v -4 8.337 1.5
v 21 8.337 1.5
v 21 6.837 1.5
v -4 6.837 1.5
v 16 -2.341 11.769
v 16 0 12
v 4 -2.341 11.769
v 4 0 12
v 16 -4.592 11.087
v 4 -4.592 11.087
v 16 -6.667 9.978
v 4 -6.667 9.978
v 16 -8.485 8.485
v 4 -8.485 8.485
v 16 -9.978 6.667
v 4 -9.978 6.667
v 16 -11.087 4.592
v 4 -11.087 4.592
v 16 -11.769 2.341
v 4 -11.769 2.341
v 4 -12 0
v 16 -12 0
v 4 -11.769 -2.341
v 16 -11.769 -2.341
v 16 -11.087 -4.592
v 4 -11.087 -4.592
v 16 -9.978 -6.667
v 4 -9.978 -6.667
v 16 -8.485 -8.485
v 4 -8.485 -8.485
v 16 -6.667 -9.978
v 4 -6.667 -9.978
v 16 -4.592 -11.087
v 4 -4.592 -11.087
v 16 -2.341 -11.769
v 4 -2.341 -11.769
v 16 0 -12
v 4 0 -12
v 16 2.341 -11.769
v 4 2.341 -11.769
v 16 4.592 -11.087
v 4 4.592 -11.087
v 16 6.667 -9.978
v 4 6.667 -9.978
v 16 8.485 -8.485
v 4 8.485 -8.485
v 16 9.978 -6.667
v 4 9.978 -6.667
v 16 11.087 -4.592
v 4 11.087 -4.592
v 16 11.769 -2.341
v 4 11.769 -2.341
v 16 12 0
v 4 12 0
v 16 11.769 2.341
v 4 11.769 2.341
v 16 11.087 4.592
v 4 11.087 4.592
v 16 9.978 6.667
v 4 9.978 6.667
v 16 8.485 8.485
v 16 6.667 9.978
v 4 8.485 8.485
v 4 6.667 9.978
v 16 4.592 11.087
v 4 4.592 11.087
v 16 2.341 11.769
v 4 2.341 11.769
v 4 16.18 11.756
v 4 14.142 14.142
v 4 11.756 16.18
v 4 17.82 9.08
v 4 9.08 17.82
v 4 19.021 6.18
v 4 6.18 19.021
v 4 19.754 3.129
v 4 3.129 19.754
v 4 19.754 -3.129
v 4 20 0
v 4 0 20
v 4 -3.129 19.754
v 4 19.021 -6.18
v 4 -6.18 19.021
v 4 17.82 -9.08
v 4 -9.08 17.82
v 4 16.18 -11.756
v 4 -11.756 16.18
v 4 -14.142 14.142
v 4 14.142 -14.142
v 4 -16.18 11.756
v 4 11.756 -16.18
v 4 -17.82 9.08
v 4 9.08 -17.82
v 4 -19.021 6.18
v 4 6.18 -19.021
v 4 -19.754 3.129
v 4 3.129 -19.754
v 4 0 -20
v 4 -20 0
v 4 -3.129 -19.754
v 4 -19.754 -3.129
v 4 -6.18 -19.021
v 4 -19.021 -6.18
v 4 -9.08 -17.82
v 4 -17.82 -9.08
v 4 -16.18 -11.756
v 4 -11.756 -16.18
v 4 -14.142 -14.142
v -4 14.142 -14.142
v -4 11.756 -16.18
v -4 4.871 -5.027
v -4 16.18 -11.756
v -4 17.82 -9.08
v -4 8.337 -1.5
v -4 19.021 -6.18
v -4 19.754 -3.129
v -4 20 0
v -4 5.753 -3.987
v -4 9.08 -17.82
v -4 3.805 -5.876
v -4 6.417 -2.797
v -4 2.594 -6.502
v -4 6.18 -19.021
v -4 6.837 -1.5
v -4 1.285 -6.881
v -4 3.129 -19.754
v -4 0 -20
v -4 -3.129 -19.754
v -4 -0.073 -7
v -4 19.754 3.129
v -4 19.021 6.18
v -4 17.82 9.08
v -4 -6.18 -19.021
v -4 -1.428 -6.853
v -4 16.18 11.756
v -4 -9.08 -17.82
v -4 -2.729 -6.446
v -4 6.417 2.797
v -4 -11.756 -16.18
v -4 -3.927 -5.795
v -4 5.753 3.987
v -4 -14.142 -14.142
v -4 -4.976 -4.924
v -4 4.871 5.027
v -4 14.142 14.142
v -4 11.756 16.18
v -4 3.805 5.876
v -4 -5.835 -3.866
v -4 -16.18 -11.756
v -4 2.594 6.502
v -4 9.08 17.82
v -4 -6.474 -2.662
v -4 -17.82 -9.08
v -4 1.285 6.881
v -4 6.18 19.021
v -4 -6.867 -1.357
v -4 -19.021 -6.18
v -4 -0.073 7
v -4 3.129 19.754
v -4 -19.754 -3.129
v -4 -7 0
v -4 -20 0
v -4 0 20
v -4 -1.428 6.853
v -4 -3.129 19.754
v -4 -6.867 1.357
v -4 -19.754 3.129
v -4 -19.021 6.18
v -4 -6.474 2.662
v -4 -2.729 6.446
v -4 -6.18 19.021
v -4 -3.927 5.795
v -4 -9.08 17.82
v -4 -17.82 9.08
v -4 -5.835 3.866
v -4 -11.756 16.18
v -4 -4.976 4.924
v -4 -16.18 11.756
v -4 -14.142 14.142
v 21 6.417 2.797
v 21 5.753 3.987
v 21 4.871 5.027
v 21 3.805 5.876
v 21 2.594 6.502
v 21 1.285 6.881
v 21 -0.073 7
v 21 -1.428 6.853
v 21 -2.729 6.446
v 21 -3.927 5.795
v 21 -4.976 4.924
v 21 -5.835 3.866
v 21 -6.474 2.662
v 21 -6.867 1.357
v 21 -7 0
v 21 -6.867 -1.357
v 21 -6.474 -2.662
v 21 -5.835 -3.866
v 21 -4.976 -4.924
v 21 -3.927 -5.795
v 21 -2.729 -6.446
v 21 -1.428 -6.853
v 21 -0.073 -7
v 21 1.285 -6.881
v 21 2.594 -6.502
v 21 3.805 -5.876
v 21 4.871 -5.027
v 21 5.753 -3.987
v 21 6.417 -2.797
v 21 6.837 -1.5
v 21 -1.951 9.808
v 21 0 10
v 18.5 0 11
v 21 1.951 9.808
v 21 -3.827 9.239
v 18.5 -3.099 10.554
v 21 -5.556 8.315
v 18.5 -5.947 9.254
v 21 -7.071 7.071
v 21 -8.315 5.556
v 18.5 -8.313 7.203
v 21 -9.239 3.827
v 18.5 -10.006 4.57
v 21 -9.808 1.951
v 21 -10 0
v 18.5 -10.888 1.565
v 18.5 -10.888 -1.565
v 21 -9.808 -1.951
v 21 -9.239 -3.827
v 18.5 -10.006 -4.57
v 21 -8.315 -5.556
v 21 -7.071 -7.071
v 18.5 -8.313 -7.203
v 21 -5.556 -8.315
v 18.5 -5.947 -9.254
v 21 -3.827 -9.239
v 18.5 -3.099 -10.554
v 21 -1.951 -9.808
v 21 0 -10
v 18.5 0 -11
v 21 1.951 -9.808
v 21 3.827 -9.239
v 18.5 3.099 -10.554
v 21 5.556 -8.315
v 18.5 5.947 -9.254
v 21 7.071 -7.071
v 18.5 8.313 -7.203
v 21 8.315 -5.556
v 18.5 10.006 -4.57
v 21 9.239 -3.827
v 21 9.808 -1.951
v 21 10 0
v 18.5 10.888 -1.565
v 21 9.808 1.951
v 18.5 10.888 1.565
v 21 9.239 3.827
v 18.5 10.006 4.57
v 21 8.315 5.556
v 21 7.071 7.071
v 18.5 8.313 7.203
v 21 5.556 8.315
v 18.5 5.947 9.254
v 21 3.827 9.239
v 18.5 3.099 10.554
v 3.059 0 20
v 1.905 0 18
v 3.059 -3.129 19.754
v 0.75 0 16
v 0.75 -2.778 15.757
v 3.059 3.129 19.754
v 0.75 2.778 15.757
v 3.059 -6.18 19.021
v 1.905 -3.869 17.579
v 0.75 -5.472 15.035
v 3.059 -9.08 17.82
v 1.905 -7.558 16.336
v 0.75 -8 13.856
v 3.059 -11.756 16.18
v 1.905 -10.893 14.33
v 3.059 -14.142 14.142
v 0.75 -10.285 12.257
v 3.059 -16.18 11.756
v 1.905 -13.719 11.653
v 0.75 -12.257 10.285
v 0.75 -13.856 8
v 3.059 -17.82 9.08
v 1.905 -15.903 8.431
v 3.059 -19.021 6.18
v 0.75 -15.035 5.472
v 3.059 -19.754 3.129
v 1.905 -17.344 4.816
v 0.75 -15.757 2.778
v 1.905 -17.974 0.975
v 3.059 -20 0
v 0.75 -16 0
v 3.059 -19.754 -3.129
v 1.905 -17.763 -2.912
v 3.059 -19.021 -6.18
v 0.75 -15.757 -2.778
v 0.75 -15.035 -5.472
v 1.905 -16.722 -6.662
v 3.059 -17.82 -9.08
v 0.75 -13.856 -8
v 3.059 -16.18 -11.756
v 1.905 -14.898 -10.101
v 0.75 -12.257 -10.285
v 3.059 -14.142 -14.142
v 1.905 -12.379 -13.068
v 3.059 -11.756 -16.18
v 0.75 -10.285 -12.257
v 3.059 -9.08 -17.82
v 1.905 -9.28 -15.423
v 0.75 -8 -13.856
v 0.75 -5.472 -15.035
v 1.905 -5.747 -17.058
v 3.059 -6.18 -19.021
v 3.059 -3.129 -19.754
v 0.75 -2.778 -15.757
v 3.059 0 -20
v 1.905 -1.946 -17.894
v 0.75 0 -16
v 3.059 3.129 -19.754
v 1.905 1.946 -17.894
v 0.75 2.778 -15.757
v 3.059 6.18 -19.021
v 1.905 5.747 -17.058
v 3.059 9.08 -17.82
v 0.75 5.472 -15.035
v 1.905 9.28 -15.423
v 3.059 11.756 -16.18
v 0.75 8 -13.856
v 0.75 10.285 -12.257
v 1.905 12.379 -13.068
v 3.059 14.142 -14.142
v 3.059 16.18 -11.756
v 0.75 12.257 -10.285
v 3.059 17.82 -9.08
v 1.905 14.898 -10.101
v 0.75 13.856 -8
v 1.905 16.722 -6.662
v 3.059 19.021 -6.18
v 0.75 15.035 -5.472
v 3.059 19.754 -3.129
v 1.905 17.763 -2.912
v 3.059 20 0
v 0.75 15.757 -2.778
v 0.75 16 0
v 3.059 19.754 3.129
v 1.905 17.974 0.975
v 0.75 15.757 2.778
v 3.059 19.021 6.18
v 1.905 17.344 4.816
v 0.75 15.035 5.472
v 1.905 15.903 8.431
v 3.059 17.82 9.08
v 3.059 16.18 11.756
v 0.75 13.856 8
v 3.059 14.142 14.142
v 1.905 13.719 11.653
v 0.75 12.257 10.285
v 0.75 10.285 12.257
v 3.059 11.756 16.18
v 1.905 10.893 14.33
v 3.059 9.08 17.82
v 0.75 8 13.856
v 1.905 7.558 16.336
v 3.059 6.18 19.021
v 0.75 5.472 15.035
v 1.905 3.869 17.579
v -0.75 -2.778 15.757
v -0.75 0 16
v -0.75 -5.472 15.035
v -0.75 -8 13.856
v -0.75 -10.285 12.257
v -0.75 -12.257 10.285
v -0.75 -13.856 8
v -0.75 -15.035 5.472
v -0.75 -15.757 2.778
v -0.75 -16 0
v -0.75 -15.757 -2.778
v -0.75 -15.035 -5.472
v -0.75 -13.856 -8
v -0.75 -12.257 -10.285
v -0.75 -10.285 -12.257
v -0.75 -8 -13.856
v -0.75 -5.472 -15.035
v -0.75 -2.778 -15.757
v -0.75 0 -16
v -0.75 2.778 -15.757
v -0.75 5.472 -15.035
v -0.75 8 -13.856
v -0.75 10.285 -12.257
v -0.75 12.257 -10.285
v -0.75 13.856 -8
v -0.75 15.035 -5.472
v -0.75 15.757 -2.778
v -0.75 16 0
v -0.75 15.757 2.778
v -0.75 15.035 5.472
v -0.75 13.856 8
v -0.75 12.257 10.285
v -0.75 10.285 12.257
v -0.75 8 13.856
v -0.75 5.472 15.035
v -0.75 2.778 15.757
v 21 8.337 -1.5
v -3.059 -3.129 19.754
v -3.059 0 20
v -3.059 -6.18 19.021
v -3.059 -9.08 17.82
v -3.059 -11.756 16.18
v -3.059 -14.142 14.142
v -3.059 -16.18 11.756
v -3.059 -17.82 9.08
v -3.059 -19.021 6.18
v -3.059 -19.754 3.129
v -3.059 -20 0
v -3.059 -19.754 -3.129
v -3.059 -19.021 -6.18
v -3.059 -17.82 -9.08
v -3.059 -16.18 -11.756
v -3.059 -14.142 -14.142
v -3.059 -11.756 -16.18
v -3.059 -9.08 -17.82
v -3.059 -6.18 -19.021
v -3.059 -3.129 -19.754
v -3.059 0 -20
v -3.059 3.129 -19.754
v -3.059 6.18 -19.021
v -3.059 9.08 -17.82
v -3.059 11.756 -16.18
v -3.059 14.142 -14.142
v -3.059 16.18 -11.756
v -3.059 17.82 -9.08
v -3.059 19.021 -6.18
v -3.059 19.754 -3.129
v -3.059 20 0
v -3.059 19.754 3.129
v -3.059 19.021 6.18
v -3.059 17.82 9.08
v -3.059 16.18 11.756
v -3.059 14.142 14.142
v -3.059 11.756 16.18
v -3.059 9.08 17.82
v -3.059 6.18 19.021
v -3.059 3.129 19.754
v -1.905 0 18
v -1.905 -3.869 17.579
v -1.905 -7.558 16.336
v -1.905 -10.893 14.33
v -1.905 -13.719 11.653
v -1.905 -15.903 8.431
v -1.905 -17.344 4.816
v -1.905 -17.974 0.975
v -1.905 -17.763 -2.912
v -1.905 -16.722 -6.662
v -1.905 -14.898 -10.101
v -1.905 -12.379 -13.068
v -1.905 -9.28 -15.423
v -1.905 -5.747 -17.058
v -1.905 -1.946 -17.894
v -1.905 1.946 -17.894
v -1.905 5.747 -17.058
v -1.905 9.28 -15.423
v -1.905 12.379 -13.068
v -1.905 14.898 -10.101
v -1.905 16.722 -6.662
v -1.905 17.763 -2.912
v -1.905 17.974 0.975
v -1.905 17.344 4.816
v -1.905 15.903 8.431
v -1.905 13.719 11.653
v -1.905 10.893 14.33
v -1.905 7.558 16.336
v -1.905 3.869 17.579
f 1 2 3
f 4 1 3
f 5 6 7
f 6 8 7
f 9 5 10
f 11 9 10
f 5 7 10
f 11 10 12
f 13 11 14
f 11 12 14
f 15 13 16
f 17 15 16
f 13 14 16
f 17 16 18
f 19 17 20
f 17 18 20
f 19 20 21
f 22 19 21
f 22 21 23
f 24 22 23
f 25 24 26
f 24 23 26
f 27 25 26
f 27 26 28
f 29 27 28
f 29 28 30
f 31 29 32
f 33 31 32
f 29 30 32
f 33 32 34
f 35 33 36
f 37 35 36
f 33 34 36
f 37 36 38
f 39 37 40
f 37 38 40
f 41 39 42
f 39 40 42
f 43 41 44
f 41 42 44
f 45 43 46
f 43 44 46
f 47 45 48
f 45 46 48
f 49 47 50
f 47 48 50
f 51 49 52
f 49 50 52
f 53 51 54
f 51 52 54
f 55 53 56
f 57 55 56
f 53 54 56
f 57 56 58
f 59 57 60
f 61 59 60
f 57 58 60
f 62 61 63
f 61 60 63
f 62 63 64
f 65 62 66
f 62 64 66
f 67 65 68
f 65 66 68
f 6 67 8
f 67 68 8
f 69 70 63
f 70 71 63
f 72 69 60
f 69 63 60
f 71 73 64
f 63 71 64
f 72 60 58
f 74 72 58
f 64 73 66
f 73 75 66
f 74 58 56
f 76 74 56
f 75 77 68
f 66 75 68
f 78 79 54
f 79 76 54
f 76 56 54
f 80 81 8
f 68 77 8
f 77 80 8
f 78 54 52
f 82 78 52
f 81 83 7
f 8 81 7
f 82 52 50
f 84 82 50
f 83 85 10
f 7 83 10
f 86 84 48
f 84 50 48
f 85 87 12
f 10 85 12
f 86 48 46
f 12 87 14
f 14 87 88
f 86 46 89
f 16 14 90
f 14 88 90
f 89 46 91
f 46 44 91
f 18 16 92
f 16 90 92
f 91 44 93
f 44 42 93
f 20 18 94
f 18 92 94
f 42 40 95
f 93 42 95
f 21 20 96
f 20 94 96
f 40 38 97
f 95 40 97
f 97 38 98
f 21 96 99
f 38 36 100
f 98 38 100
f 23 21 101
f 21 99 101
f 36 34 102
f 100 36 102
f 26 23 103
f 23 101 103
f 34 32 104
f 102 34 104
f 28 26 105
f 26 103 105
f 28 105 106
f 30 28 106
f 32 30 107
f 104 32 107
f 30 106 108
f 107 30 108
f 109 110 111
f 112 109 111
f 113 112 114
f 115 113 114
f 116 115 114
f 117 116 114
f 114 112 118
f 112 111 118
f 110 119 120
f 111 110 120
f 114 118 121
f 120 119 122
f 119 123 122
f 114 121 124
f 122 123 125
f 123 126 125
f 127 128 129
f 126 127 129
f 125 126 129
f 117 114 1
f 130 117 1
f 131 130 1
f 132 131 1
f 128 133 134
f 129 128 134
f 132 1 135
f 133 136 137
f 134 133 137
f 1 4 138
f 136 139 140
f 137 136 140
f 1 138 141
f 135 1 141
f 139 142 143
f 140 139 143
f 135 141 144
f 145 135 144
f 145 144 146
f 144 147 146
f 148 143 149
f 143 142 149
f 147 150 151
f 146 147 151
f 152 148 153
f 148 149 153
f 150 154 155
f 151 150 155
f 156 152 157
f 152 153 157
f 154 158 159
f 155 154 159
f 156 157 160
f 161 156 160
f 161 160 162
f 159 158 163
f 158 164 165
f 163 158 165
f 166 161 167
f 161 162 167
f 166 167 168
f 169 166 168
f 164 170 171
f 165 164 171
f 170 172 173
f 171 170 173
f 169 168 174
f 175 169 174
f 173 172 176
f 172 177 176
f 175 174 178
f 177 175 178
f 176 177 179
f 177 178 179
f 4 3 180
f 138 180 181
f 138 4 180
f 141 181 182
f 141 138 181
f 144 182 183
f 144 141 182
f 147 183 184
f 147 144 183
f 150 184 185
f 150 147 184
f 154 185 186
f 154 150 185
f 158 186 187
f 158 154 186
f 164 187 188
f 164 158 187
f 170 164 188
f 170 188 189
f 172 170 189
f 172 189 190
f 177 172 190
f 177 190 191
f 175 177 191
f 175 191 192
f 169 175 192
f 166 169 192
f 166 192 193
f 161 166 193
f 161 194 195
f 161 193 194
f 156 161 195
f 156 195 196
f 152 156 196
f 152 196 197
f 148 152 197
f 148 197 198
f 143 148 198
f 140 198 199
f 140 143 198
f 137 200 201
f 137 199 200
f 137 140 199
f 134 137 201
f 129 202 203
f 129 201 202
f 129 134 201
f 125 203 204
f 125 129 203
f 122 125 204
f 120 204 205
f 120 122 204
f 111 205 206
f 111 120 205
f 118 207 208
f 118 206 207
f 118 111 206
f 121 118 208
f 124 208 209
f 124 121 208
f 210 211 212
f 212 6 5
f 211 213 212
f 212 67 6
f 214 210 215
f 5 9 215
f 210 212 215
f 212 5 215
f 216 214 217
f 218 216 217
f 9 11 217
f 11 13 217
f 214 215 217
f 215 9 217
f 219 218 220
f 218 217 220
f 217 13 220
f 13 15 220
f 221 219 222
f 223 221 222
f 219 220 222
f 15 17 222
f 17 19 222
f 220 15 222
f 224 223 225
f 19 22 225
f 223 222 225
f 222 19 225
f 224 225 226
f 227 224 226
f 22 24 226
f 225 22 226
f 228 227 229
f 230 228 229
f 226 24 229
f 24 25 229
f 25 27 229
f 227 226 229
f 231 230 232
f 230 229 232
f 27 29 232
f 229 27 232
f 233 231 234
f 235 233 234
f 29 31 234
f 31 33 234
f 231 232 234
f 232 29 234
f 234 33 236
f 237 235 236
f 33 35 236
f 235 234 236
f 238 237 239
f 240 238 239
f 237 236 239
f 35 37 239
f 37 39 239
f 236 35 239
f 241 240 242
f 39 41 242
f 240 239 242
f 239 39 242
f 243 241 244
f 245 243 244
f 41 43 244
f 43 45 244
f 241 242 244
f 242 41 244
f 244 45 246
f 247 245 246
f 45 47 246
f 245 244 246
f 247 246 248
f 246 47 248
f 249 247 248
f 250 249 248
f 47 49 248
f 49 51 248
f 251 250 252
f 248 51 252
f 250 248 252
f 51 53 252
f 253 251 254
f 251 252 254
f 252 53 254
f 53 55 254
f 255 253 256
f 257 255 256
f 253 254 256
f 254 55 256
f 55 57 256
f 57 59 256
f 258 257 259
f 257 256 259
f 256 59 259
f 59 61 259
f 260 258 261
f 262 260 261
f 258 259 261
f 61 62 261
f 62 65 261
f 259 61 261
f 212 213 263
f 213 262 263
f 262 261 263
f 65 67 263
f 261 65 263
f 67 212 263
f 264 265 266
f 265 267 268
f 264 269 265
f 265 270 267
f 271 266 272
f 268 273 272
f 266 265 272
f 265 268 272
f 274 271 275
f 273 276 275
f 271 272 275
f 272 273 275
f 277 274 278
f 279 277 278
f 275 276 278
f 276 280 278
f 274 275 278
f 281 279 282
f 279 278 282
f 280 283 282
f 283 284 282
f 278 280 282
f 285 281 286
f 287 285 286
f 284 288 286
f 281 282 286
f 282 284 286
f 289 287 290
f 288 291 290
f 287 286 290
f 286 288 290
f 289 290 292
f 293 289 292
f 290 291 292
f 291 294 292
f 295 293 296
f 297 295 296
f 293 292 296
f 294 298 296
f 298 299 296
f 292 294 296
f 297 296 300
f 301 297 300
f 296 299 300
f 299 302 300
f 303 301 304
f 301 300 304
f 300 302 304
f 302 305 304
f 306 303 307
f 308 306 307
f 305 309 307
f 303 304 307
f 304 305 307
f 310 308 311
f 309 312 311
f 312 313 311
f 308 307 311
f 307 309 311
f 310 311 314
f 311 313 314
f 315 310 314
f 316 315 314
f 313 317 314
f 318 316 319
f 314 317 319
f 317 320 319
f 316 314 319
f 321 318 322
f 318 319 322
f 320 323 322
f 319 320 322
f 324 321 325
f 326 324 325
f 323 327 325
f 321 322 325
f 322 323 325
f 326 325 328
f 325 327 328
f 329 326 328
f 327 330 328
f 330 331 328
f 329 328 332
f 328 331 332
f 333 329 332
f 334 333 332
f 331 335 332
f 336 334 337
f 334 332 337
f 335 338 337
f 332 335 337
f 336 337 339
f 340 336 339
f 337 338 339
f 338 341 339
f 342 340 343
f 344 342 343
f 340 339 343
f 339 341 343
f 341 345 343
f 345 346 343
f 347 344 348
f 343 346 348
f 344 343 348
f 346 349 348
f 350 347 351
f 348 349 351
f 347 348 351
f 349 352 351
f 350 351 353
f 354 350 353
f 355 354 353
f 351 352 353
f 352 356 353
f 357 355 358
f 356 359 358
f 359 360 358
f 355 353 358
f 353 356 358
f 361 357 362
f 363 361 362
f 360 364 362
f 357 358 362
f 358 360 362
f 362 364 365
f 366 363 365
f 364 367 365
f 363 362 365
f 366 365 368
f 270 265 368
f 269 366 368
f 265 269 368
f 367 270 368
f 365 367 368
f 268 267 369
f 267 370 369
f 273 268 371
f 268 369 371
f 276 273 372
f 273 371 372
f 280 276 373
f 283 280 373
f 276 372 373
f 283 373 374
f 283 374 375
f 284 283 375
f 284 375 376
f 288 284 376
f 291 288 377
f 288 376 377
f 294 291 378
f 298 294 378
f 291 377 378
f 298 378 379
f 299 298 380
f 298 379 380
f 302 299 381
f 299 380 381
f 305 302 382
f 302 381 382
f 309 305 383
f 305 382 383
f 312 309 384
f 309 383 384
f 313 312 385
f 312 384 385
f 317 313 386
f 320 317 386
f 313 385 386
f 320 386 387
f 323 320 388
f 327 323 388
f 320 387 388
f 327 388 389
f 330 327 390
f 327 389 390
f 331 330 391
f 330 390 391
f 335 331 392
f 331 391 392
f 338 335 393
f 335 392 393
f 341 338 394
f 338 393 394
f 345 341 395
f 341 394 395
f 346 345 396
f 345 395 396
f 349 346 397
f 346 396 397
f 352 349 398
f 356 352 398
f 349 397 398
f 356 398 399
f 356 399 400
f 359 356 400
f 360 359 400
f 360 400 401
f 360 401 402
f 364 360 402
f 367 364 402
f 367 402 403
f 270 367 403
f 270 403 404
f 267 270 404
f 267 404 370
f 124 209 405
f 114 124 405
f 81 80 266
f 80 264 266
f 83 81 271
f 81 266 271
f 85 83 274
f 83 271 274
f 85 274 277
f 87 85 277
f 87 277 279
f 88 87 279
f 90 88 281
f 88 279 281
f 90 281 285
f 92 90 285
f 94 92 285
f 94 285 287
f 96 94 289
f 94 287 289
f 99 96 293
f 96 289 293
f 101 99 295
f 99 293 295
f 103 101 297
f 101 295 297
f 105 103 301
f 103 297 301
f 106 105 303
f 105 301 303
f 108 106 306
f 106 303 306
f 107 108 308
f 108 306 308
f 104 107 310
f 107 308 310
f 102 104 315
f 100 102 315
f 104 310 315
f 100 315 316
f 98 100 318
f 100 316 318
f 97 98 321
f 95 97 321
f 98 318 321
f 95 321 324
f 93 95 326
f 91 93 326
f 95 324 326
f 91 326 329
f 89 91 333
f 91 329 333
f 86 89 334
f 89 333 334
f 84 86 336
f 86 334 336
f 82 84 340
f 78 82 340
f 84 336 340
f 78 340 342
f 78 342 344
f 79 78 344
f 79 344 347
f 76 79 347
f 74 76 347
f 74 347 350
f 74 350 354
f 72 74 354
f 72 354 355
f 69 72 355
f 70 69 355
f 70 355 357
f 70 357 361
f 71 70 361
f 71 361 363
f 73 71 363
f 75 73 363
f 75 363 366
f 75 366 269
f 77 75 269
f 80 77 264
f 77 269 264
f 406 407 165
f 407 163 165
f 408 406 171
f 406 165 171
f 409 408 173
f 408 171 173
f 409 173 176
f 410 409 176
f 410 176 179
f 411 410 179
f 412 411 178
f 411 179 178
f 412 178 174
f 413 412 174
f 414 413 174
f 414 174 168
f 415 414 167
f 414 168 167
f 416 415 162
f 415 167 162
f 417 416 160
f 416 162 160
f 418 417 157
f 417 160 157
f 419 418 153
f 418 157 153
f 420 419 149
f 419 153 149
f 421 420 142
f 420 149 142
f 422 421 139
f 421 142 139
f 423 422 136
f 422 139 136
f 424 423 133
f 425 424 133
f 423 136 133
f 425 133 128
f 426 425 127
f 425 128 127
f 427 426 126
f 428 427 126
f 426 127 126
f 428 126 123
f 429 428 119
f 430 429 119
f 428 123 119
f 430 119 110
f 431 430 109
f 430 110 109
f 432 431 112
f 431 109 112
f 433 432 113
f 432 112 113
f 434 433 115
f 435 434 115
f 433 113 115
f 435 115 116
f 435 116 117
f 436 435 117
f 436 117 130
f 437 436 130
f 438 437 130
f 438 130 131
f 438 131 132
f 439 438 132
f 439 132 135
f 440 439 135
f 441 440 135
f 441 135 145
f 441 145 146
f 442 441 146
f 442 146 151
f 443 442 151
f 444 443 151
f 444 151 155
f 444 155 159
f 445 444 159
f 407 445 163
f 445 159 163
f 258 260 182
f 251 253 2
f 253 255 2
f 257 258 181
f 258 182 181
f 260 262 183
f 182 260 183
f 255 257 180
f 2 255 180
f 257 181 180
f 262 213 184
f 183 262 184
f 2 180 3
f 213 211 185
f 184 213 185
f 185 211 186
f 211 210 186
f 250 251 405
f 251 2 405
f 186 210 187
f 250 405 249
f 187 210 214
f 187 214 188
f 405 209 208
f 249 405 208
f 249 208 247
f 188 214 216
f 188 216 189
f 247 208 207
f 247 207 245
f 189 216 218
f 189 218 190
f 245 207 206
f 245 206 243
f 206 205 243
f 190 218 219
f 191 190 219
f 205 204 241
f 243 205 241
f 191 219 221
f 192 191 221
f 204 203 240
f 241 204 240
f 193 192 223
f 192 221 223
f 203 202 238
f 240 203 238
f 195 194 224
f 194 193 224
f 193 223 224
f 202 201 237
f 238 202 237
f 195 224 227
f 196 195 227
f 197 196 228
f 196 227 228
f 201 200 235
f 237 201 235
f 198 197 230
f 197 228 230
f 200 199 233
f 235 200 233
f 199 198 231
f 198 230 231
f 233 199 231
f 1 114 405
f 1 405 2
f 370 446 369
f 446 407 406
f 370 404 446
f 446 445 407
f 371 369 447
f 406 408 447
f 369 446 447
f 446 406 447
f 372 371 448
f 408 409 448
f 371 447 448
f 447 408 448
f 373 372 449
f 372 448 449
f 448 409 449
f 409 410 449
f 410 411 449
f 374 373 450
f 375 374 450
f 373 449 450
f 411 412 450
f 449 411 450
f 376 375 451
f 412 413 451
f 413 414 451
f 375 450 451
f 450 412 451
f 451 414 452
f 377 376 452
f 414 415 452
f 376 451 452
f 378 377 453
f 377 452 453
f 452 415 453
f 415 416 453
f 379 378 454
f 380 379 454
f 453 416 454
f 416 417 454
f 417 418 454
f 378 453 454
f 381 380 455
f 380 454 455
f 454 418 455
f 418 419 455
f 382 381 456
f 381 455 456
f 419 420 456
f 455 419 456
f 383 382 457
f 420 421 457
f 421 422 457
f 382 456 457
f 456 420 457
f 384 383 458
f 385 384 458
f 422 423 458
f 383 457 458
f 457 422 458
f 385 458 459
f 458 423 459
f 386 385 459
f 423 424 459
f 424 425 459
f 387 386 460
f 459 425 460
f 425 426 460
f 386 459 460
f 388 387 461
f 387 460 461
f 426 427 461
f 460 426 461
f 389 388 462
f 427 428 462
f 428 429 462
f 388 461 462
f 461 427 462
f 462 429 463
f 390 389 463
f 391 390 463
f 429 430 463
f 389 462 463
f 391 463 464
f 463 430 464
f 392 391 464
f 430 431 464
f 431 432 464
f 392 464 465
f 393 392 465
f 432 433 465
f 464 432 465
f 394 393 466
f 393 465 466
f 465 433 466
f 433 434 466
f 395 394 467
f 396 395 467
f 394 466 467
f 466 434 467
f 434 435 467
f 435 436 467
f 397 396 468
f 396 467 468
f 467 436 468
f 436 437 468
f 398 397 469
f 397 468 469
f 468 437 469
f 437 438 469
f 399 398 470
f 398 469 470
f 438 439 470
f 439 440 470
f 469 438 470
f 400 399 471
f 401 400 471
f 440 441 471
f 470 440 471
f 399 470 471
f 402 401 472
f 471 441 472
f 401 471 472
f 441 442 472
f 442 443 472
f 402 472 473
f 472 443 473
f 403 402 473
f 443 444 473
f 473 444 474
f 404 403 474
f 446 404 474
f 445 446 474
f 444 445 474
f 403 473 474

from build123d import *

# Parameters (mm, degrees)
CUT_EXTRUDE1_DEPTH = 38.749172176


with BuildPart() as part:
    # Sketch1 → Revolve1 (revolve)
    with BuildSketch(Plane.XY, mode=Mode.PRIVATE) as revolve1_sk:
        Polygon((0.75, 16), (-0.75, 16), (-3.059401077, 20), (-4, 20), (-4, 0), (4, 0), (21, 0), (21, 10), (16, 12), (4, 12), (4, 20), (3.059401077, 20), align=None)
    revolve(revolve1_sk.sketch.rotate(Axis((-19.792492436, 0, 0), (1, 0, 0)), 90), axis=Axis((-19.792492436, 0, 0), (1, 0, 0)))

    # Sketch2 → Cut-Extrude1 (cut, through all)
    with BuildSketch(Plane.ZY.offset(4)):
        with BuildLine():
            Line((-1.5, 8.337397166), (1.5, 8.337397166))
            Line((1.5, 8.337397166), (1.5, 6.837397166))
            ThreePointArc((1.5, 6.837397166), (0, -7), (-1.5, 6.837397166))
            Line((-1.5, 6.837397166), (-1.5, 8.337397166))
        make_face()
    extrude(amount=-CUT_EXTRUDE1_DEPTH, mode=Mode.SUBTRACT)


solid = part.part
